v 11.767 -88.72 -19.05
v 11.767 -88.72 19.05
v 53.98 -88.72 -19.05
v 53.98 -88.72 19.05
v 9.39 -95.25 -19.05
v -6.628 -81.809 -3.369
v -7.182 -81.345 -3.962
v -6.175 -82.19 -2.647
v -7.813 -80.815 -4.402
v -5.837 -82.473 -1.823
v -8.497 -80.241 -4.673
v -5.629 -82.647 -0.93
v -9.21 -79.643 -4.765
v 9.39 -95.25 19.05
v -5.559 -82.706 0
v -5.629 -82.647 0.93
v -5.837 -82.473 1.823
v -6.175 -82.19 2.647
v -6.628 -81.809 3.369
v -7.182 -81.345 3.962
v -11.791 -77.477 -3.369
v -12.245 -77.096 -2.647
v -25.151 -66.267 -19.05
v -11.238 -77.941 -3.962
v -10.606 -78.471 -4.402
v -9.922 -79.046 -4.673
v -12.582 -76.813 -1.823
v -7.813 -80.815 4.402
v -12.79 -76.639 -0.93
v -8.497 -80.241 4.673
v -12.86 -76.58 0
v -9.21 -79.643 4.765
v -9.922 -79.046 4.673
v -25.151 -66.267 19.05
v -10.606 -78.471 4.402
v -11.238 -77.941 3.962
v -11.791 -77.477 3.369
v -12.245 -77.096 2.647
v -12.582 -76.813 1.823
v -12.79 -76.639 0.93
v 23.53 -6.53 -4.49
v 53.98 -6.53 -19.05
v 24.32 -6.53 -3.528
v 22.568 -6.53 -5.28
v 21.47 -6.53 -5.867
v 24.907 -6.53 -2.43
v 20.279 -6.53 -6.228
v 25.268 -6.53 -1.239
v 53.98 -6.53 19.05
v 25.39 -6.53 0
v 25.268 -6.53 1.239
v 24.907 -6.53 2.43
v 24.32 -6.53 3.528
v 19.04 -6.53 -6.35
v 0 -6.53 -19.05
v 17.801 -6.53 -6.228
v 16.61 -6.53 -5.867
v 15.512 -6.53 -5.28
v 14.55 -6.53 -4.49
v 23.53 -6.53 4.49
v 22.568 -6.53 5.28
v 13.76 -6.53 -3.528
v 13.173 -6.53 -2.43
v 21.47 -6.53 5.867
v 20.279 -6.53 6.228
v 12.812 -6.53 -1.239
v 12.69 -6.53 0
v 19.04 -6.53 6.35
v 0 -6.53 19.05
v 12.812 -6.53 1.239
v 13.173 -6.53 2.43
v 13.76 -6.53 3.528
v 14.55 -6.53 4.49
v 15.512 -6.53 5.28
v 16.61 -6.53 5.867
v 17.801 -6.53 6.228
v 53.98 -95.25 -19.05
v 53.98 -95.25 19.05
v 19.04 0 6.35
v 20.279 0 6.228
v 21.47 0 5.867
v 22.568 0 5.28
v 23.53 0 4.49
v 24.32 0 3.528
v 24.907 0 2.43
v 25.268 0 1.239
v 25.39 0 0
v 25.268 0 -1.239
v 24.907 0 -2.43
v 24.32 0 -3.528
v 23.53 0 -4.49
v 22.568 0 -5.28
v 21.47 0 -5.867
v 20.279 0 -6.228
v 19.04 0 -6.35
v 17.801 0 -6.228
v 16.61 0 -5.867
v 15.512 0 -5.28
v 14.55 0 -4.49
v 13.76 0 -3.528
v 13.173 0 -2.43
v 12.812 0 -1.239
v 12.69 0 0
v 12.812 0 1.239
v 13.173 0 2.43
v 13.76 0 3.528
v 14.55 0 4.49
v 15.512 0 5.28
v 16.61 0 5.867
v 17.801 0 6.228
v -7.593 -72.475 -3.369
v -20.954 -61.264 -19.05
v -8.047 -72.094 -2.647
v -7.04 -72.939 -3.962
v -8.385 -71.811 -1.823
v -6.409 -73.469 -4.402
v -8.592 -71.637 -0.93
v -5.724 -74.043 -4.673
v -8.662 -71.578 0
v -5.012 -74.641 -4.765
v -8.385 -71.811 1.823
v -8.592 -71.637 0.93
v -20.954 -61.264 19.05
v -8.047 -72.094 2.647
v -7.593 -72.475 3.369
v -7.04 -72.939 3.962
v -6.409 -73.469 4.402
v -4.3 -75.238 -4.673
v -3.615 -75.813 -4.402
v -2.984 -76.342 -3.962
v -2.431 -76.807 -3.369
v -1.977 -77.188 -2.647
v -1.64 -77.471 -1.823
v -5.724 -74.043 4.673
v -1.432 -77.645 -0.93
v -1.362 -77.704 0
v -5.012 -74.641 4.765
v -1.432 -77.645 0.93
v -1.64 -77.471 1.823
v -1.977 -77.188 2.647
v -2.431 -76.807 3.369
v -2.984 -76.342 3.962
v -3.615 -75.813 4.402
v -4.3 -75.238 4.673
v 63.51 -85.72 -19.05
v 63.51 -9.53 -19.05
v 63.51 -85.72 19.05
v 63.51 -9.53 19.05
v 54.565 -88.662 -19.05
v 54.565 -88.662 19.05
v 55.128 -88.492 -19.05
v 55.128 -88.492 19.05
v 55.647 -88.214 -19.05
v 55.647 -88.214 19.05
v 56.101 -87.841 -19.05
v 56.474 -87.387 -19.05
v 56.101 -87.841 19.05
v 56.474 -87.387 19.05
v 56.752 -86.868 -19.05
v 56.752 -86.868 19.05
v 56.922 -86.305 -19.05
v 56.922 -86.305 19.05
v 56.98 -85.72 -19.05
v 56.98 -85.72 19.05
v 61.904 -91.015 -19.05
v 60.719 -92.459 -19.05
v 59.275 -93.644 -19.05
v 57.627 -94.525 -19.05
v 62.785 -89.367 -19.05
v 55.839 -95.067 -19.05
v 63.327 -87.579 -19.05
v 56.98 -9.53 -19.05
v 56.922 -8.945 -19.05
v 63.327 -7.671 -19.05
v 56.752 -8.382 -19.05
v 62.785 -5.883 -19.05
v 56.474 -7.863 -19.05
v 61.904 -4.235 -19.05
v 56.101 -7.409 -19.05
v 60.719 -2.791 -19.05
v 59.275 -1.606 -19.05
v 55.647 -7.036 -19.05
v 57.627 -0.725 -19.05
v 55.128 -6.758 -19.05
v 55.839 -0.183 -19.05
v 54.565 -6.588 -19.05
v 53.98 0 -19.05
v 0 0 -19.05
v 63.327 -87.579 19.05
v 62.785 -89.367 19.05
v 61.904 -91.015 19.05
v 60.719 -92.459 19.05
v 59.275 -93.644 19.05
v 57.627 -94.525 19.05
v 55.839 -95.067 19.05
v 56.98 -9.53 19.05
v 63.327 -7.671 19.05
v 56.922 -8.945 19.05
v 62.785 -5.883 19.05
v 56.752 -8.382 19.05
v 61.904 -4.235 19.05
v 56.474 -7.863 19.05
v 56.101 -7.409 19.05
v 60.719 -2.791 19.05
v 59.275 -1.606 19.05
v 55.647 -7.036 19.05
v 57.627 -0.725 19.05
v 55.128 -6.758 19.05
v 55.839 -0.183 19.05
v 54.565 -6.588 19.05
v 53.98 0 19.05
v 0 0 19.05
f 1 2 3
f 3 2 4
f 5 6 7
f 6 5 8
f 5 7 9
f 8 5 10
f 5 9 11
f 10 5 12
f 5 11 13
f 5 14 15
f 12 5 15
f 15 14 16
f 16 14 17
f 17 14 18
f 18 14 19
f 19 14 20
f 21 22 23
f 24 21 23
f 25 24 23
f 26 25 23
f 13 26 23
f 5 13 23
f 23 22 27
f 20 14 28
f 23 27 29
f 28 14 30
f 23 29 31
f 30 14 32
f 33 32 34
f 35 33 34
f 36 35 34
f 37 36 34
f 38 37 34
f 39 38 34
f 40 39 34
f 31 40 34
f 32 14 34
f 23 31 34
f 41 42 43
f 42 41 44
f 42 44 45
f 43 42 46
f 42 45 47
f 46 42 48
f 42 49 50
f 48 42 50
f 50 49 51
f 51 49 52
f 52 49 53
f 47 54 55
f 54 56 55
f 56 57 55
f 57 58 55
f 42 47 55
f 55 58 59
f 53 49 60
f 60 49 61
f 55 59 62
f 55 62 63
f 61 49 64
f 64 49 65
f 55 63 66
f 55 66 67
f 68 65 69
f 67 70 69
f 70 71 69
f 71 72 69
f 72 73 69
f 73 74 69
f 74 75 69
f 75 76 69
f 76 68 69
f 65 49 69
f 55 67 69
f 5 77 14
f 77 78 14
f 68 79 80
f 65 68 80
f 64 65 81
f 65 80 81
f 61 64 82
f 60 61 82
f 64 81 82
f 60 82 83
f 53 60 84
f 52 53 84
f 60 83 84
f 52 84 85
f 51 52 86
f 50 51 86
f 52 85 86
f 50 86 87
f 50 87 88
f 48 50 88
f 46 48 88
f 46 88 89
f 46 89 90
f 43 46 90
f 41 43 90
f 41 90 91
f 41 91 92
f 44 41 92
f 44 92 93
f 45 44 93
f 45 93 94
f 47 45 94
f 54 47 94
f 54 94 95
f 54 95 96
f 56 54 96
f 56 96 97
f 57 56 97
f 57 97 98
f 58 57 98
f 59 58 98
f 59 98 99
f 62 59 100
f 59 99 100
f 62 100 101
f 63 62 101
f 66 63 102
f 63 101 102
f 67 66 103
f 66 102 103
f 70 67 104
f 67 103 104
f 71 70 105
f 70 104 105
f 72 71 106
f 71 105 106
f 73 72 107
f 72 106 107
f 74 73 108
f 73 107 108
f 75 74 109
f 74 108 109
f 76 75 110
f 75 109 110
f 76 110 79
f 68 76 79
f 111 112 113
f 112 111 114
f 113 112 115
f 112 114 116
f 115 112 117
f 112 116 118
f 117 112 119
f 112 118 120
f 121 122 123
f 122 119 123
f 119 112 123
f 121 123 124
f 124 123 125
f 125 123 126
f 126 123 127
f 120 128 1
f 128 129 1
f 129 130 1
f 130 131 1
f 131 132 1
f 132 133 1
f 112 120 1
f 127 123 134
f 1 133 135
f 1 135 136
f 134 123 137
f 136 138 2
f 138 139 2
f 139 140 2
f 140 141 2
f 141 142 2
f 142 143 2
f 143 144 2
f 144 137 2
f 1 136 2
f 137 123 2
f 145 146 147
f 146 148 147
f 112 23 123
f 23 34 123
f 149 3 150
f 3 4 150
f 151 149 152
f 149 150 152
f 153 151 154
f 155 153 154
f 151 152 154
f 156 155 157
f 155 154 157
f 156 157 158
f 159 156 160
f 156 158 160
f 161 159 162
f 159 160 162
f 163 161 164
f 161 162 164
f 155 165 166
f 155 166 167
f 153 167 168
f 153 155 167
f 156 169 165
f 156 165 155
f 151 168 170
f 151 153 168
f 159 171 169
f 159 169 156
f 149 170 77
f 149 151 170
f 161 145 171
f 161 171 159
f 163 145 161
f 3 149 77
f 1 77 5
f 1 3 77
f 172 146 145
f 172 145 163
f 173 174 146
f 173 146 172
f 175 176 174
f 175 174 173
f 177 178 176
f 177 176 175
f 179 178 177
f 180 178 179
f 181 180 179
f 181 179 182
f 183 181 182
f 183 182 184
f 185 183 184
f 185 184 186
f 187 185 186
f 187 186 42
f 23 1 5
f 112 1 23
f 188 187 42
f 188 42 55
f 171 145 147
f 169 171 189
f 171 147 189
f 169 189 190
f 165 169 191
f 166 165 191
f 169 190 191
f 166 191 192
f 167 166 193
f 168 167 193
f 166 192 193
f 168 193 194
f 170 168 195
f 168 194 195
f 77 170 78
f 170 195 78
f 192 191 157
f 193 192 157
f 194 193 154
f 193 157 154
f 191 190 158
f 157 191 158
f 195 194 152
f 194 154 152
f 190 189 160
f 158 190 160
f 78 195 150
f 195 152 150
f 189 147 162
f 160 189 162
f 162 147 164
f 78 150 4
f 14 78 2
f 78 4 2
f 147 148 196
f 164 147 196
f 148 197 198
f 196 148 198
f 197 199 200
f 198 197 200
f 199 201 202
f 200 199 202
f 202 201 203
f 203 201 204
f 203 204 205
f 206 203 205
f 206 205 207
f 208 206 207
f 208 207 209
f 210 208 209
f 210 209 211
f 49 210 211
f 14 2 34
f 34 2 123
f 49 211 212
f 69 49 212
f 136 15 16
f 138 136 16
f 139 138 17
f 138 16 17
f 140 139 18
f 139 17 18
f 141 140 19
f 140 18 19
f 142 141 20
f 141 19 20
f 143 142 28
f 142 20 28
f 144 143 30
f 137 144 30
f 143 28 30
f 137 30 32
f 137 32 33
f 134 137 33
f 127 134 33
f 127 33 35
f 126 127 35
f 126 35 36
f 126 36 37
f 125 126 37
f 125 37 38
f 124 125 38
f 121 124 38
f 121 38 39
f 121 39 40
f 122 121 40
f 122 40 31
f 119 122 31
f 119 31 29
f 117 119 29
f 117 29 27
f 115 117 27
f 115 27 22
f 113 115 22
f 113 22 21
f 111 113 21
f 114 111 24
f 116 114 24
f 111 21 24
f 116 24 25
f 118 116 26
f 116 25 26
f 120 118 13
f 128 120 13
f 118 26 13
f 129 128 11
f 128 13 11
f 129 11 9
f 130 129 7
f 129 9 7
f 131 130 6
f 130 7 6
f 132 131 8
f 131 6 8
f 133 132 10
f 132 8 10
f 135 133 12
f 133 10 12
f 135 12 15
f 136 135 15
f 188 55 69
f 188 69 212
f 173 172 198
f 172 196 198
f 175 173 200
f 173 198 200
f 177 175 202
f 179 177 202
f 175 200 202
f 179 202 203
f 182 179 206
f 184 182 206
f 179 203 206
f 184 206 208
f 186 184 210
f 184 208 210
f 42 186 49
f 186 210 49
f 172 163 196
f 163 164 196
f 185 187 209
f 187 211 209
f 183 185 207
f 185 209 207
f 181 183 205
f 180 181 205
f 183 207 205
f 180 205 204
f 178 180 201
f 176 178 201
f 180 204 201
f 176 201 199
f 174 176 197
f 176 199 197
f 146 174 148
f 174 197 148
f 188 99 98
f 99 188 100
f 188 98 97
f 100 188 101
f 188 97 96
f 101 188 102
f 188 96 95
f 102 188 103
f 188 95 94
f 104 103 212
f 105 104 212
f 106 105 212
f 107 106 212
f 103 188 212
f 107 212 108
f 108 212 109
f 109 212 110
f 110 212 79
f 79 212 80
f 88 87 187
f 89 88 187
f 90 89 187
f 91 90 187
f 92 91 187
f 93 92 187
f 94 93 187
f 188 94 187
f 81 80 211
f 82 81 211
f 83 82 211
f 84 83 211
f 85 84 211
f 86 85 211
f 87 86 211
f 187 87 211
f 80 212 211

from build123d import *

# Parameters (mm, degrees)
BOSS_EXTRUDE1_DEPTH = 19.05
CUT_EXTRUDE1_REACH  = 118.056
SKETCH2_R           = 6.35
CUT_EXTRUDE2_REACH  = 121.753
SKETCH3_R           = 4.765


with BuildPart() as part:
    # Sketch1 → Boss-Extrude1 (new, symmetric)
    with BuildSketch(Plane.XY):
        with BuildLine():
            Line((0, 0), (53.98, 0))
            ThreePointArc((53.98, 0), (60.718727625, -2.791272375), (63.51, -9.53))
            Line((63.51, -9.53), (63.51, -85.72))
            ThreePointArc((63.51, -85.72), (60.718727625, -92.458727625), (53.98, -95.25))
            Line((53.98, -95.25), (9.39, -95.25))
            Line((9.39, -95.25), (-25.15094394, -66.266706679))
            Line((-25.15094394, -66.266706679), (-20.953540849, -61.264436466))
            Line((-20.953540849, -61.264436466), (11.76672563, -88.72))
            Line((11.76672563, -88.72), (53.98, -88.72))
            ThreePointArc((53.98, -88.72), (56.101320344, -87.841320344), (56.98, -85.72))
            Line((56.98, -85.72), (56.98, -9.53))
            ThreePointArc((56.98, -9.53), (56.101320344, -7.408679656), (53.98, -6.53))
            Line((53.98, -6.53), (0, -6.53))
            Line((0, -6.53), (0, 0))
        make_face()
    extrude(amount=BOSS_EXTRUDE1_DEPTH, both=True)

    # Sketch2 → Cut-Extrude1 (cut, up to next)
    with BuildSketch(Plane(origin=(0, 0, 0), x_dir=(1, 0, 0), z_dir=(0, 1, 0)), mode=Mode.PRIVATE) as cut_extrude1_sk1:
        with Locations(Location((19.04, 0, 0), (0, 0, 270))):
            Circle(SKETCH2_R)
    cut_extrude1_tool1 = extrude(cut_extrude1_sk1.sketch, amount=-CUT_EXTRUDE1_REACH, mode=Mode.PRIVATE) & part.part
    add(cut_extrude1_tool1.solids().sort_by_distance((19.04, 0, 0))[0], mode=Mode.SUBTRACT)

    # Sketch3 → Cut-Extrude2 (cut, up to next)
    with BuildSketch(Plane(origin=(-43.021747431, -51.271322061, 0), x_dir=(0.7660444431189771, -0.6427876096865404, 0), z_dir=(-0.6427876096865404, -0.7660444431189771, 0)), mode=Mode.PRIVATE) as cut_extrude2_sk1:
        with Locations((44.138677144, 0)):
            Circle(SKETCH3_R)
    cut_extrude2_tool1 = extrude(cut_extrude2_sk1.sketch, amount=-CUT_EXTRUDE2_REACH, mode=Mode.PRIVATE) & part.part
    add(cut_extrude2_tool1.solids().sort_by_distance((-9.209559, -79.643117, 0))[0], mode=Mode.SUBTRACT)


solid = part.part
